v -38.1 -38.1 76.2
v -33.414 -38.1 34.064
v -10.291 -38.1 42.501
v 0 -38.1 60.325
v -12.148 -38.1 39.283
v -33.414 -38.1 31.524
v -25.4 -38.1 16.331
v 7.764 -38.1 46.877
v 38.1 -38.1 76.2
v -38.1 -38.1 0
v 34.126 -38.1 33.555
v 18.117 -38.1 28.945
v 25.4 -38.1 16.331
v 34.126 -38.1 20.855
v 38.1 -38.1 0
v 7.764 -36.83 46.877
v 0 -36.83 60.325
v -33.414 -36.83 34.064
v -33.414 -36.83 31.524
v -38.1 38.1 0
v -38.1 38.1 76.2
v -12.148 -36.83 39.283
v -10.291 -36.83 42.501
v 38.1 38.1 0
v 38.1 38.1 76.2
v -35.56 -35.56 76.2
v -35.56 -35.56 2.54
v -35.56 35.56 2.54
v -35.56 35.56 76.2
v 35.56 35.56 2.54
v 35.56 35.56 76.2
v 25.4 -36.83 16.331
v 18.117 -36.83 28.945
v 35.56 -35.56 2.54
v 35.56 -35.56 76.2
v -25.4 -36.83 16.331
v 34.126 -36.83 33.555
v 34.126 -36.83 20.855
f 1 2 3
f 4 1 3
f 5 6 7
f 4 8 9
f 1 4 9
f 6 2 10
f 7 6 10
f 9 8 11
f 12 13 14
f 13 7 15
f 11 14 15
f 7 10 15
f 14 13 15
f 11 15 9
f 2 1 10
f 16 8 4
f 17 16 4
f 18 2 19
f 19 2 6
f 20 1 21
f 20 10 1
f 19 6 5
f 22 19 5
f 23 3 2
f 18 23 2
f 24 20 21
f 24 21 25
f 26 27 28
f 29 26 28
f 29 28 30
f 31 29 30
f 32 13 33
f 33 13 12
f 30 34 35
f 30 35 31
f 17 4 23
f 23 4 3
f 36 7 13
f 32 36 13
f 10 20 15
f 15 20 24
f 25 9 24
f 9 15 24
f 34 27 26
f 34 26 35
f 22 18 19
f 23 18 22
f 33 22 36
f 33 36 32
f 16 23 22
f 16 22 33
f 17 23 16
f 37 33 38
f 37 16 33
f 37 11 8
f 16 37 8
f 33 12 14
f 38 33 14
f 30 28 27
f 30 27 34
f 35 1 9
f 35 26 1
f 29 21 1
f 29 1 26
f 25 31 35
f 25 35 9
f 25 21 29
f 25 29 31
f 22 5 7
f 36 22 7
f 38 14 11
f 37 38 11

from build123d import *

# Parameters (mm, degrees)
F0_W     = 76.2
F0_H     = 76.2
F1_DEPTH = 2.54
F2_W     = 76.2
F2_H     = 76.2
F2_W_2   = 71.12
F2_H_2   = 71.12
F3_DEPTH = 73.66
F5_DEPTH = 1.27


with BuildPart() as f1:
    # F0 (on Top) → F1 (new body)
    with BuildSketch(Plane.XY):
        Rectangle(F0_W, F0_H)
    extrude(amount=F1_DEPTH)

    # F2 (on face) → F3 (join)
    with BuildSketch(Plane.XY.offset(2.54)):
        Rectangle(F2_W, F2_H)
        Rectangle(F2_W_2, F2_H_2, mode=Mode.SUBTRACT)
    extrude(amount=F3_DEPTH)

    # F4 (on face) → F5 (cut)
    with BuildSketch(Plane.XZ.offset(38.1)):
        Polygon((-12.148399, 39.283356), (-25.4, 16.330909), (25.4, 16.330909), (18.117015, 28.945409), (3.810367, 36.175158), (3.810367, 48.875158), (7.764111, 46.877166), (0, 60.325), (-10.290568, 42.501213), (-5.152611, 44.375874), (-5.152611, 41.835874), align=None)
        Polygon((-33.413898, 31.524319), (-12.148399, 39.283356), (-10.290568, 42.501213), (-33.413898, 34.064319), align=None)
        Polygon((-10.290568, 42.501213), (-12.148399, 39.283356), (-5.152611, 41.835874), (-5.152611, 44.375874), align=None)
        Polygon((3.810367, 36.175158), (18.117015, 28.945409), (7.764111, 46.877166), (3.810367, 48.875158), align=None)
        Polygon((7.764111, 46.877166), (18.117015, 28.945409), (34.126167, 20.855314), (34.126167, 33.555314), align=None)
    extrude(amount=-F5_DEPTH, mode=Mode.SUBTRACT)


solid = f1.part
